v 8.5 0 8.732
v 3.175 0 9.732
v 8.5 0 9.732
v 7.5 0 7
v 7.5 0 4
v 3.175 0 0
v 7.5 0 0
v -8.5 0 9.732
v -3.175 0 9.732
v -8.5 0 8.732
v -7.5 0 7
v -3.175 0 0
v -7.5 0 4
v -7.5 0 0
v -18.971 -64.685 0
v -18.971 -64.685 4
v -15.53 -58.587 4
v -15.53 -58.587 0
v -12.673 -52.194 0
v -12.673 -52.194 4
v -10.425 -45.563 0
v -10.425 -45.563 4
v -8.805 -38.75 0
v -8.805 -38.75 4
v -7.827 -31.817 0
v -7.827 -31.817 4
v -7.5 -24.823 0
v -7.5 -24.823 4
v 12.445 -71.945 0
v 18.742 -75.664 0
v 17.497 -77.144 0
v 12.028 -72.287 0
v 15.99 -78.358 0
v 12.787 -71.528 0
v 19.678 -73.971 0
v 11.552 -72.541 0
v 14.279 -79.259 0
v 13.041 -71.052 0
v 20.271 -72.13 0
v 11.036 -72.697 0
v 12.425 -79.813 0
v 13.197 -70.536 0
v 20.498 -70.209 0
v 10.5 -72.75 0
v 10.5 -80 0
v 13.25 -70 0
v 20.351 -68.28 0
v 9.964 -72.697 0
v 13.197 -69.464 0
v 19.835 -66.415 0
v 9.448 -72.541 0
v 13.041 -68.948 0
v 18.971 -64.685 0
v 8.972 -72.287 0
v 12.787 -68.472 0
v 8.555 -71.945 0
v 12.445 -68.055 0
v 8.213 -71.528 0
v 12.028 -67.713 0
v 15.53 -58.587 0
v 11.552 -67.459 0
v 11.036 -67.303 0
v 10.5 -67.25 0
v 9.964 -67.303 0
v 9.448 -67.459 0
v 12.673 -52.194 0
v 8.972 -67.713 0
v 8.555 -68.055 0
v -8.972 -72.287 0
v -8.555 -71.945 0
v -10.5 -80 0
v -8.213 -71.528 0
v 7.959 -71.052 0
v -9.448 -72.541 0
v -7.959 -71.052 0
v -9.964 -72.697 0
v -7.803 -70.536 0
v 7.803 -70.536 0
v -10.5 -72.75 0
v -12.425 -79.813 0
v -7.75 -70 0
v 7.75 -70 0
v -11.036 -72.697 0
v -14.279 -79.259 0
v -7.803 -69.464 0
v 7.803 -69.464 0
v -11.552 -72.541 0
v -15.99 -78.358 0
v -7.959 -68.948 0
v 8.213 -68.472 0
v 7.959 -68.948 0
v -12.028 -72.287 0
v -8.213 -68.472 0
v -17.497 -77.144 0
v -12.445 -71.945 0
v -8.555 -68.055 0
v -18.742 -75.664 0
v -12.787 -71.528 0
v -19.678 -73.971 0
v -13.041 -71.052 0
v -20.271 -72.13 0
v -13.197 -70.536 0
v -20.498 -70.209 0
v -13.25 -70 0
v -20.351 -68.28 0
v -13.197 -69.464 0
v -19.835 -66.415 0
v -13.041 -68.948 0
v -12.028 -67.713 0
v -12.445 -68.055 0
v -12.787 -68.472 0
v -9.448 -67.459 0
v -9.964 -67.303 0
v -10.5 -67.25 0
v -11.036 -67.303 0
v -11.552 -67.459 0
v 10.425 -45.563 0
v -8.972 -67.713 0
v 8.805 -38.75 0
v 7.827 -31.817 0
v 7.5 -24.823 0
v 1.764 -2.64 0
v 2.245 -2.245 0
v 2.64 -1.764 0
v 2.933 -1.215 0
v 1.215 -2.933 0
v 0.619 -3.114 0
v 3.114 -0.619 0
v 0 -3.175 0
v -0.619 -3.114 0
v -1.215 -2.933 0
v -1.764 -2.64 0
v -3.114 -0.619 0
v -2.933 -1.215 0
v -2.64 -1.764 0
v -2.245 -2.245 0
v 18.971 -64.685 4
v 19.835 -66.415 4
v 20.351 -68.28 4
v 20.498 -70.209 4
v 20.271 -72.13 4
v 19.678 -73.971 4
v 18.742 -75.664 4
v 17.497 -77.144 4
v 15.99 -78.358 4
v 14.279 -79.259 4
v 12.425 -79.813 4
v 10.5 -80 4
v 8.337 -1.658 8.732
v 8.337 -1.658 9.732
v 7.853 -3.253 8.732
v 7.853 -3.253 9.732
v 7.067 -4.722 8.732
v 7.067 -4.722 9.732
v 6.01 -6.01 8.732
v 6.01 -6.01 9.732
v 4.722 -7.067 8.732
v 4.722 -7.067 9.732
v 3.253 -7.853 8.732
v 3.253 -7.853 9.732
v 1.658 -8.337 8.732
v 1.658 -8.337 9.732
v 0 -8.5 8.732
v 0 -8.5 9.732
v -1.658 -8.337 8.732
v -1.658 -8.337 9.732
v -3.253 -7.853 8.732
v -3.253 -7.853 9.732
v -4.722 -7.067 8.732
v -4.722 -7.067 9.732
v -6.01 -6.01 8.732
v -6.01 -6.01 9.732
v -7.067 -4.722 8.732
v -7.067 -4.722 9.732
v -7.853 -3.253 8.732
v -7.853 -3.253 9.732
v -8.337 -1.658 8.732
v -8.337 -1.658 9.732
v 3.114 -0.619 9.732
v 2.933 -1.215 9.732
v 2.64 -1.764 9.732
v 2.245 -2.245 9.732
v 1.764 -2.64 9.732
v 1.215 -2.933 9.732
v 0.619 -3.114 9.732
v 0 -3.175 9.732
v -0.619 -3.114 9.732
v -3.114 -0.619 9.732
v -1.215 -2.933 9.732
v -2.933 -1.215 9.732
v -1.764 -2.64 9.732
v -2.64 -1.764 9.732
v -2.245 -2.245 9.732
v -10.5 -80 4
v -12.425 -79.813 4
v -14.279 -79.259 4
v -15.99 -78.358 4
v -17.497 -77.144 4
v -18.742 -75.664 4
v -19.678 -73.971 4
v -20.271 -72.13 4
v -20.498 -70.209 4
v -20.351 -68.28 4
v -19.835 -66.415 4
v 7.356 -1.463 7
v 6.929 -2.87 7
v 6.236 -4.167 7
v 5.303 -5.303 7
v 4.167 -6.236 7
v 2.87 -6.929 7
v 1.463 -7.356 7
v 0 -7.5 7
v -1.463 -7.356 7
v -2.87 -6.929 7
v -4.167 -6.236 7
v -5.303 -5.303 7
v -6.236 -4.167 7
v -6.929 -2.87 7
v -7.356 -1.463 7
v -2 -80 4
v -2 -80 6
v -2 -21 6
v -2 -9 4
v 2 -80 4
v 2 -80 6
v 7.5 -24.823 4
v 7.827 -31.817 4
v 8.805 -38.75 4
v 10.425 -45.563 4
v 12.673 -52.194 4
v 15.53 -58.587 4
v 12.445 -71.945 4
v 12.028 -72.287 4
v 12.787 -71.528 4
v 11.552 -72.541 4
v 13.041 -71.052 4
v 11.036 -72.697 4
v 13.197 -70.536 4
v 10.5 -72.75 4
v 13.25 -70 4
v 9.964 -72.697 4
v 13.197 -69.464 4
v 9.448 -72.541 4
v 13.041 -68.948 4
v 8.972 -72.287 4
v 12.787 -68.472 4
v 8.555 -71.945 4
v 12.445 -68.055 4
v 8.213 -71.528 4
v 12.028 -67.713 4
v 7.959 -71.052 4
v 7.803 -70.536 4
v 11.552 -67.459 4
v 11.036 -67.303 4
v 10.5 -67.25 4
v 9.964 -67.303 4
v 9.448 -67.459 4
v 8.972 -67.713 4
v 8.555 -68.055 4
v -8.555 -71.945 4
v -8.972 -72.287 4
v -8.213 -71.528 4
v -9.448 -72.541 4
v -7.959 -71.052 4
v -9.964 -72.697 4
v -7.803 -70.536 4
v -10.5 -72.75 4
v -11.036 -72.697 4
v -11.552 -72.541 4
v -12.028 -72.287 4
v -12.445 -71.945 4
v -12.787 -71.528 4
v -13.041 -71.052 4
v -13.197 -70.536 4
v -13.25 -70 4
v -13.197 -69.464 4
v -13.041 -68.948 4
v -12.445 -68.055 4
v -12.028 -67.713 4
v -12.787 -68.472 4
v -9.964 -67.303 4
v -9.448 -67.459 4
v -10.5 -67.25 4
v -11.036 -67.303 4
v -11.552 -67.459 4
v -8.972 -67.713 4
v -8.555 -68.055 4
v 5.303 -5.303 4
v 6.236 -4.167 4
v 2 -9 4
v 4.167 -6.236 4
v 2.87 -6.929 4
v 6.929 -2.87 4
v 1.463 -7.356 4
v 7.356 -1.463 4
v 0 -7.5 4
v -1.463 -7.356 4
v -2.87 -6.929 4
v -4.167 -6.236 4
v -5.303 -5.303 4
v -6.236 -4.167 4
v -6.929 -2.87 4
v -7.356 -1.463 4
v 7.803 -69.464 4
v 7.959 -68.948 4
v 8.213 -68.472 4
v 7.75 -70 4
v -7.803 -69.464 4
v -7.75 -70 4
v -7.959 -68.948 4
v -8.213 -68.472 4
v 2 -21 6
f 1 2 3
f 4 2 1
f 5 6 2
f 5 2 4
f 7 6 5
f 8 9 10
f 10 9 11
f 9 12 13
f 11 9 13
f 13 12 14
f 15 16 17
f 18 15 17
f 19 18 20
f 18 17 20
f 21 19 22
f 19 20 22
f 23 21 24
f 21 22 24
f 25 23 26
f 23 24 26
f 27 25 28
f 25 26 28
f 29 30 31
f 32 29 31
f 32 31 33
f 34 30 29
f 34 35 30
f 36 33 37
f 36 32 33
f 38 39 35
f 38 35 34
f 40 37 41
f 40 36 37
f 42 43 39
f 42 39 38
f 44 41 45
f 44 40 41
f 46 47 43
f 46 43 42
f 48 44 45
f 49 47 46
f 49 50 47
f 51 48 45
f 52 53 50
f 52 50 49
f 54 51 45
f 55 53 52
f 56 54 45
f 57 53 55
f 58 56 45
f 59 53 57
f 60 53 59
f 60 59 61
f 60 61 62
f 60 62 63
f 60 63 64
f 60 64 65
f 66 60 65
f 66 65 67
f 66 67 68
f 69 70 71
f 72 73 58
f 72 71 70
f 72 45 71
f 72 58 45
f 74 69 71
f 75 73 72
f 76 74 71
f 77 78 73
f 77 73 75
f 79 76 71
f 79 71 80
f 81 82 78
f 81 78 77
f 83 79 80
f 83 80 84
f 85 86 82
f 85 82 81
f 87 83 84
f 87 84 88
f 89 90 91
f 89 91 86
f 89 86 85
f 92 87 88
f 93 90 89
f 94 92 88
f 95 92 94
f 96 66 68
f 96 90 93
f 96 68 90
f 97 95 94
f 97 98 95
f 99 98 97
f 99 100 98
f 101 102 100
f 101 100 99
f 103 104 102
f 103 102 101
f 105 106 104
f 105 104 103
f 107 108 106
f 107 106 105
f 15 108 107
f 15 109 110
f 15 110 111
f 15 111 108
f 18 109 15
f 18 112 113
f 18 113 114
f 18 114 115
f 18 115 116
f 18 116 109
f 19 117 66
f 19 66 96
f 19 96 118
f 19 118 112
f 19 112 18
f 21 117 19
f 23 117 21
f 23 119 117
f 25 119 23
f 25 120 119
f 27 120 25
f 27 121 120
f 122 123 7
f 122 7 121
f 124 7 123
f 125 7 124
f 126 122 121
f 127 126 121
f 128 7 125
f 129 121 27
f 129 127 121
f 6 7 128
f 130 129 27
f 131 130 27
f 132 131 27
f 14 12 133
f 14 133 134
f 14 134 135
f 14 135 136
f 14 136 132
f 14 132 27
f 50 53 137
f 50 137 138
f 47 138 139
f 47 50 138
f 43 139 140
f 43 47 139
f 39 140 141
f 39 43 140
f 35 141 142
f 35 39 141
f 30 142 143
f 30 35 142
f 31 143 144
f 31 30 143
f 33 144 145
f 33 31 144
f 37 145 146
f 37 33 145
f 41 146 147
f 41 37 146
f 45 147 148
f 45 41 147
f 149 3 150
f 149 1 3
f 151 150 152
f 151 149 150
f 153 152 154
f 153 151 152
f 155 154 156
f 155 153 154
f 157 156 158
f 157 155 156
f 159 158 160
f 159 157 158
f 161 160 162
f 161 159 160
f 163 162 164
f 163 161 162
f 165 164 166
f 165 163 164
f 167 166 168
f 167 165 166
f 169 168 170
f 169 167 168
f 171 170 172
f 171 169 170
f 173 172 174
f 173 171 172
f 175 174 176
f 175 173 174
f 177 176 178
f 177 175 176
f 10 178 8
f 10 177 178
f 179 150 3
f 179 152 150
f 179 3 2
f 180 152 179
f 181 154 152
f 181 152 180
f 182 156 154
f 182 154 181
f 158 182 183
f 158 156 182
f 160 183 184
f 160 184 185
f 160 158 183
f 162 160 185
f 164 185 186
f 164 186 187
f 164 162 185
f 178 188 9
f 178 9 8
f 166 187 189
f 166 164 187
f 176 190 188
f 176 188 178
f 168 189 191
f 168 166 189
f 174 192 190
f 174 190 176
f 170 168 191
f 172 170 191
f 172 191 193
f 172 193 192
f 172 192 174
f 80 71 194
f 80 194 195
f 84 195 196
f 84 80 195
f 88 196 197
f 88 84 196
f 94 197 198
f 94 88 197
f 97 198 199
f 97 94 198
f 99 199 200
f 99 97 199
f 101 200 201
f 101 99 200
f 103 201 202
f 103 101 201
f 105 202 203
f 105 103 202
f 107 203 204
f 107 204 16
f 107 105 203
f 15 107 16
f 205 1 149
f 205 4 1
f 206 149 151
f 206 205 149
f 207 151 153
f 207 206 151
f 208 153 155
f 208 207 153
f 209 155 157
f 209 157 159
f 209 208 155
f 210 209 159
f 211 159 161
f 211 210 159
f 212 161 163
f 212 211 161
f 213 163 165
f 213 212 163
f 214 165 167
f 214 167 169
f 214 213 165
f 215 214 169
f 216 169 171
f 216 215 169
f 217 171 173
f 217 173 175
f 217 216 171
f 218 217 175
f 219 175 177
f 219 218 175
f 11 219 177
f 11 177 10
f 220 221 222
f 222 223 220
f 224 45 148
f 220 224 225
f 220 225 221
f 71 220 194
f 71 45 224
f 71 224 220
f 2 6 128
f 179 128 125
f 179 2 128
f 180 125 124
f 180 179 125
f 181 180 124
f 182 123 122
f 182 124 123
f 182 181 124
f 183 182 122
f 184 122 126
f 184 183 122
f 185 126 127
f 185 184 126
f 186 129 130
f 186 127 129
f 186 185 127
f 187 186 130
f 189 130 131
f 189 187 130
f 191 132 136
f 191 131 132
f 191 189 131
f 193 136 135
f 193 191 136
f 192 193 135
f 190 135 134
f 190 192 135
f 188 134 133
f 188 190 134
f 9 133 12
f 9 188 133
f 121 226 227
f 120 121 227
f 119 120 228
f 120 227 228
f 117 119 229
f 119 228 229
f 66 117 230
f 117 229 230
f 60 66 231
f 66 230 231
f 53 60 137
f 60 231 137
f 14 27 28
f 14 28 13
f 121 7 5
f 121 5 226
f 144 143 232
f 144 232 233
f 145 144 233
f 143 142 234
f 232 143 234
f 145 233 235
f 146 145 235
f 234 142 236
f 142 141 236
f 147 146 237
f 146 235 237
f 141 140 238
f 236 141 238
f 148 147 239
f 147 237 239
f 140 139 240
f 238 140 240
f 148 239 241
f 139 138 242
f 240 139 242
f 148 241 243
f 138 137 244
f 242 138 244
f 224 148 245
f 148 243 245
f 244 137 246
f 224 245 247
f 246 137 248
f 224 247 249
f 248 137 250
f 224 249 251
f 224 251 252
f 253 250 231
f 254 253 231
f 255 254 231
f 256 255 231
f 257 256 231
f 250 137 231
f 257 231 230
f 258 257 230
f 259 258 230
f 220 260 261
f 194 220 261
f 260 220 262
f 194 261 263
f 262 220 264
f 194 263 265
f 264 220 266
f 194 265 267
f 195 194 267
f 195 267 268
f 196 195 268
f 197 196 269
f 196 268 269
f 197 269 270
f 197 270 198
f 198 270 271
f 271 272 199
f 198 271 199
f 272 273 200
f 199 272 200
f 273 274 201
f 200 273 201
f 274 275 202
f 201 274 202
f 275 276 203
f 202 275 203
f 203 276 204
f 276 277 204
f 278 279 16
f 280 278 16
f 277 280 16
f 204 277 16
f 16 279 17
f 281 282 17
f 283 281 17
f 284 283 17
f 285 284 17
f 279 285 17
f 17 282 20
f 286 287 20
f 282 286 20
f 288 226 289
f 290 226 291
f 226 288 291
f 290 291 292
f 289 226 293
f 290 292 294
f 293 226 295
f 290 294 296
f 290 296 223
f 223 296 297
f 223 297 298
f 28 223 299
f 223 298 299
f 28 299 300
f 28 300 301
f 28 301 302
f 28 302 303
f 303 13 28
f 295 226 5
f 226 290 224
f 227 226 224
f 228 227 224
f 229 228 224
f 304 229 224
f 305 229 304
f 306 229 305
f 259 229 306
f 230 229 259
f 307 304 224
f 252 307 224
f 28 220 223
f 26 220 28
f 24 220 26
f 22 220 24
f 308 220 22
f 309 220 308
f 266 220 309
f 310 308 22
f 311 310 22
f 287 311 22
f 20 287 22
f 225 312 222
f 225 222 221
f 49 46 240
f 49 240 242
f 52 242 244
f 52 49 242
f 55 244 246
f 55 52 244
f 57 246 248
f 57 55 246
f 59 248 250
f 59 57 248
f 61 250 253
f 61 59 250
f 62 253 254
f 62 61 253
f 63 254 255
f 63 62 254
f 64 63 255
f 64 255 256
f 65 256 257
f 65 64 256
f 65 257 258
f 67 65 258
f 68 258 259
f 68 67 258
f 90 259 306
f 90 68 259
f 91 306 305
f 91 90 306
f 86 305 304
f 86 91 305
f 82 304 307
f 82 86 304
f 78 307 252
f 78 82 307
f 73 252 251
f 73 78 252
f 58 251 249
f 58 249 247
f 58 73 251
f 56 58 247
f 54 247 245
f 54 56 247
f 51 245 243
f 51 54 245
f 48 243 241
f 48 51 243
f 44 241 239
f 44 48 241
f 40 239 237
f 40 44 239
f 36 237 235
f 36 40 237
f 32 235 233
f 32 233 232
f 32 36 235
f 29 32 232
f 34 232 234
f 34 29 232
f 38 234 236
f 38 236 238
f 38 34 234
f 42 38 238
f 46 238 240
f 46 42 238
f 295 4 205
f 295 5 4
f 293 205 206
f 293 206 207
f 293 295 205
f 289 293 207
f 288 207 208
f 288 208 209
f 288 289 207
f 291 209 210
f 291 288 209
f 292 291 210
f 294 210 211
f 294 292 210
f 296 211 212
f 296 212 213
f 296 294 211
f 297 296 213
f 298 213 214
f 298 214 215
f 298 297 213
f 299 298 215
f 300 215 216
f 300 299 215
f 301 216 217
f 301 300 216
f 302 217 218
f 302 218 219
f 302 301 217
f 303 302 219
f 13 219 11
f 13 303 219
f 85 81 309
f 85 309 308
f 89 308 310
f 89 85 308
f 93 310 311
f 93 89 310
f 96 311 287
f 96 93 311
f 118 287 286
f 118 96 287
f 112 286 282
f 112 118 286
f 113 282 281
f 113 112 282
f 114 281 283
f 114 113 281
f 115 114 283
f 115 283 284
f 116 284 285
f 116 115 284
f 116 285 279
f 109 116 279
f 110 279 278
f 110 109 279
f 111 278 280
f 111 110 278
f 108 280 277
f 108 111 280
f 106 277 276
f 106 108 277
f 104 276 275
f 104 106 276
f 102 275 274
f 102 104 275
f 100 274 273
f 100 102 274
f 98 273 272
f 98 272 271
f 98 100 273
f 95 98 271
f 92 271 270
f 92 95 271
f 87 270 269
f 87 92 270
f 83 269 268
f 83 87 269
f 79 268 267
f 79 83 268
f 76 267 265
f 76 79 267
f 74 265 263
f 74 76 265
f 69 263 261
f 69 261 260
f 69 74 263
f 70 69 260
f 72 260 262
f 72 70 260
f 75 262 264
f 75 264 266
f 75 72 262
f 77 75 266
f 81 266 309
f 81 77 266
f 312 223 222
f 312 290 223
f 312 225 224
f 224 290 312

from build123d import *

# Parameters (mm, degrees)
SKETCH1_R           = 2.75
BOSS_EXTRUDE1_DEPTH = 4
REVOLVE1_ANGLE      = 180
BOSS_EXTRUDE2_DEPTH = 2
BOSS_EXTRUDE3_DEPTH = 4


with BuildPart() as part:
    # Sketch1 → Boss-Extrude1 (new body)
    with BuildSketch(Plane.XY):
        with BuildLine():
            Line((-10.5, -60), (-7.5, -60))
            Line((-7.5, -60), (-7.5, 0))
            Line((-7.5, 0), (-3.175, 0))
            ThreePointArc((-3.175, 0), (0, -3.175), (3.175, 0))
            Line((3.175, 0), (7.5, 0))
            Line((7.5, 0), (7.5, -60))
            Line((7.5, -60), (10.5, -60))
            ThreePointArc((10.5, -60), (20.5, -70), (10.5, -80))
            Line((10.5, -80), (-10.5, -80))
            ThreePointArc((-10.5, -80), (-20.5, -70), (-10.5, -60))
        make_face()
        with Locations((-10.5, -70)):
            Circle(SKETCH1_R, mode=Mode.SUBTRACT)
        with Locations((10.5, -70)):
            Circle(SKETCH1_R, mode=Mode.SUBTRACT)
    extrude(amount=BOSS_EXTRUDE1_DEPTH)

    # Sketch2 → Revolve1 (revolve)
    with BuildSketch(Plane(origin=(0, 0, 0), x_dir=(1, 0, 0), z_dir=(0, 1, 0))):
        Polygon((7.5, -4), (3.175, -4), (3.175, -9.732050808), (8.5, -9.732050808), (8.5, -8.732050808), (7.5, -7), align=None)
    revolve(axis=Axis((0, 0, 0), (0, 0, -1)), revolution_arc=REVOLVE1_ANGLE)

    # Sketch3 → Boss-Extrude2 (add, symmetric)
    with BuildSketch(Plane(origin=(0, 0, 0), x_dir=(0, 0, -1), z_dir=(1, 0, 0))):
        Polygon((-4, -9), (-6, -21), (-6, -80), (-4, -80), align=None)
    extrude(amount=BOSS_EXTRUDE2_DEPTH, both=True)

    # Sketch4 → Boss-Extrude3 (add)
    with BuildSketch(Plane.XY.offset(4)):
        with BuildLine():
            Line((-7.5, -60), (-10.5, -60))
            ThreePointArc((-10.5, -60), (-15.339942392, -61.249288164), (-18.970588235, -64.685008471))
            ThreePointArc((-18.970588235, -64.685008471), (-10.424671758, -45.562558961), (-7.5, -24.822572008))
            Line((-7.5, -24.822572008), (-7.5, -60))
        make_face()
        with BuildLine():
            Line((7.5, -60), (7.5, -24.822572008))
            ThreePointArc((7.5, -24.822572008), (10.424671758, -45.562558961), (18.970588235, -64.685008471))
            ThreePointArc((18.970588235, -64.685008471), (15.339942392, -61.249288164), (10.5, -60))
            Line((10.5, -60), (7.5, -60))
        make_face()
    extrude(amount=-BOSS_EXTRUDE3_DEPTH)


solid = part.part
